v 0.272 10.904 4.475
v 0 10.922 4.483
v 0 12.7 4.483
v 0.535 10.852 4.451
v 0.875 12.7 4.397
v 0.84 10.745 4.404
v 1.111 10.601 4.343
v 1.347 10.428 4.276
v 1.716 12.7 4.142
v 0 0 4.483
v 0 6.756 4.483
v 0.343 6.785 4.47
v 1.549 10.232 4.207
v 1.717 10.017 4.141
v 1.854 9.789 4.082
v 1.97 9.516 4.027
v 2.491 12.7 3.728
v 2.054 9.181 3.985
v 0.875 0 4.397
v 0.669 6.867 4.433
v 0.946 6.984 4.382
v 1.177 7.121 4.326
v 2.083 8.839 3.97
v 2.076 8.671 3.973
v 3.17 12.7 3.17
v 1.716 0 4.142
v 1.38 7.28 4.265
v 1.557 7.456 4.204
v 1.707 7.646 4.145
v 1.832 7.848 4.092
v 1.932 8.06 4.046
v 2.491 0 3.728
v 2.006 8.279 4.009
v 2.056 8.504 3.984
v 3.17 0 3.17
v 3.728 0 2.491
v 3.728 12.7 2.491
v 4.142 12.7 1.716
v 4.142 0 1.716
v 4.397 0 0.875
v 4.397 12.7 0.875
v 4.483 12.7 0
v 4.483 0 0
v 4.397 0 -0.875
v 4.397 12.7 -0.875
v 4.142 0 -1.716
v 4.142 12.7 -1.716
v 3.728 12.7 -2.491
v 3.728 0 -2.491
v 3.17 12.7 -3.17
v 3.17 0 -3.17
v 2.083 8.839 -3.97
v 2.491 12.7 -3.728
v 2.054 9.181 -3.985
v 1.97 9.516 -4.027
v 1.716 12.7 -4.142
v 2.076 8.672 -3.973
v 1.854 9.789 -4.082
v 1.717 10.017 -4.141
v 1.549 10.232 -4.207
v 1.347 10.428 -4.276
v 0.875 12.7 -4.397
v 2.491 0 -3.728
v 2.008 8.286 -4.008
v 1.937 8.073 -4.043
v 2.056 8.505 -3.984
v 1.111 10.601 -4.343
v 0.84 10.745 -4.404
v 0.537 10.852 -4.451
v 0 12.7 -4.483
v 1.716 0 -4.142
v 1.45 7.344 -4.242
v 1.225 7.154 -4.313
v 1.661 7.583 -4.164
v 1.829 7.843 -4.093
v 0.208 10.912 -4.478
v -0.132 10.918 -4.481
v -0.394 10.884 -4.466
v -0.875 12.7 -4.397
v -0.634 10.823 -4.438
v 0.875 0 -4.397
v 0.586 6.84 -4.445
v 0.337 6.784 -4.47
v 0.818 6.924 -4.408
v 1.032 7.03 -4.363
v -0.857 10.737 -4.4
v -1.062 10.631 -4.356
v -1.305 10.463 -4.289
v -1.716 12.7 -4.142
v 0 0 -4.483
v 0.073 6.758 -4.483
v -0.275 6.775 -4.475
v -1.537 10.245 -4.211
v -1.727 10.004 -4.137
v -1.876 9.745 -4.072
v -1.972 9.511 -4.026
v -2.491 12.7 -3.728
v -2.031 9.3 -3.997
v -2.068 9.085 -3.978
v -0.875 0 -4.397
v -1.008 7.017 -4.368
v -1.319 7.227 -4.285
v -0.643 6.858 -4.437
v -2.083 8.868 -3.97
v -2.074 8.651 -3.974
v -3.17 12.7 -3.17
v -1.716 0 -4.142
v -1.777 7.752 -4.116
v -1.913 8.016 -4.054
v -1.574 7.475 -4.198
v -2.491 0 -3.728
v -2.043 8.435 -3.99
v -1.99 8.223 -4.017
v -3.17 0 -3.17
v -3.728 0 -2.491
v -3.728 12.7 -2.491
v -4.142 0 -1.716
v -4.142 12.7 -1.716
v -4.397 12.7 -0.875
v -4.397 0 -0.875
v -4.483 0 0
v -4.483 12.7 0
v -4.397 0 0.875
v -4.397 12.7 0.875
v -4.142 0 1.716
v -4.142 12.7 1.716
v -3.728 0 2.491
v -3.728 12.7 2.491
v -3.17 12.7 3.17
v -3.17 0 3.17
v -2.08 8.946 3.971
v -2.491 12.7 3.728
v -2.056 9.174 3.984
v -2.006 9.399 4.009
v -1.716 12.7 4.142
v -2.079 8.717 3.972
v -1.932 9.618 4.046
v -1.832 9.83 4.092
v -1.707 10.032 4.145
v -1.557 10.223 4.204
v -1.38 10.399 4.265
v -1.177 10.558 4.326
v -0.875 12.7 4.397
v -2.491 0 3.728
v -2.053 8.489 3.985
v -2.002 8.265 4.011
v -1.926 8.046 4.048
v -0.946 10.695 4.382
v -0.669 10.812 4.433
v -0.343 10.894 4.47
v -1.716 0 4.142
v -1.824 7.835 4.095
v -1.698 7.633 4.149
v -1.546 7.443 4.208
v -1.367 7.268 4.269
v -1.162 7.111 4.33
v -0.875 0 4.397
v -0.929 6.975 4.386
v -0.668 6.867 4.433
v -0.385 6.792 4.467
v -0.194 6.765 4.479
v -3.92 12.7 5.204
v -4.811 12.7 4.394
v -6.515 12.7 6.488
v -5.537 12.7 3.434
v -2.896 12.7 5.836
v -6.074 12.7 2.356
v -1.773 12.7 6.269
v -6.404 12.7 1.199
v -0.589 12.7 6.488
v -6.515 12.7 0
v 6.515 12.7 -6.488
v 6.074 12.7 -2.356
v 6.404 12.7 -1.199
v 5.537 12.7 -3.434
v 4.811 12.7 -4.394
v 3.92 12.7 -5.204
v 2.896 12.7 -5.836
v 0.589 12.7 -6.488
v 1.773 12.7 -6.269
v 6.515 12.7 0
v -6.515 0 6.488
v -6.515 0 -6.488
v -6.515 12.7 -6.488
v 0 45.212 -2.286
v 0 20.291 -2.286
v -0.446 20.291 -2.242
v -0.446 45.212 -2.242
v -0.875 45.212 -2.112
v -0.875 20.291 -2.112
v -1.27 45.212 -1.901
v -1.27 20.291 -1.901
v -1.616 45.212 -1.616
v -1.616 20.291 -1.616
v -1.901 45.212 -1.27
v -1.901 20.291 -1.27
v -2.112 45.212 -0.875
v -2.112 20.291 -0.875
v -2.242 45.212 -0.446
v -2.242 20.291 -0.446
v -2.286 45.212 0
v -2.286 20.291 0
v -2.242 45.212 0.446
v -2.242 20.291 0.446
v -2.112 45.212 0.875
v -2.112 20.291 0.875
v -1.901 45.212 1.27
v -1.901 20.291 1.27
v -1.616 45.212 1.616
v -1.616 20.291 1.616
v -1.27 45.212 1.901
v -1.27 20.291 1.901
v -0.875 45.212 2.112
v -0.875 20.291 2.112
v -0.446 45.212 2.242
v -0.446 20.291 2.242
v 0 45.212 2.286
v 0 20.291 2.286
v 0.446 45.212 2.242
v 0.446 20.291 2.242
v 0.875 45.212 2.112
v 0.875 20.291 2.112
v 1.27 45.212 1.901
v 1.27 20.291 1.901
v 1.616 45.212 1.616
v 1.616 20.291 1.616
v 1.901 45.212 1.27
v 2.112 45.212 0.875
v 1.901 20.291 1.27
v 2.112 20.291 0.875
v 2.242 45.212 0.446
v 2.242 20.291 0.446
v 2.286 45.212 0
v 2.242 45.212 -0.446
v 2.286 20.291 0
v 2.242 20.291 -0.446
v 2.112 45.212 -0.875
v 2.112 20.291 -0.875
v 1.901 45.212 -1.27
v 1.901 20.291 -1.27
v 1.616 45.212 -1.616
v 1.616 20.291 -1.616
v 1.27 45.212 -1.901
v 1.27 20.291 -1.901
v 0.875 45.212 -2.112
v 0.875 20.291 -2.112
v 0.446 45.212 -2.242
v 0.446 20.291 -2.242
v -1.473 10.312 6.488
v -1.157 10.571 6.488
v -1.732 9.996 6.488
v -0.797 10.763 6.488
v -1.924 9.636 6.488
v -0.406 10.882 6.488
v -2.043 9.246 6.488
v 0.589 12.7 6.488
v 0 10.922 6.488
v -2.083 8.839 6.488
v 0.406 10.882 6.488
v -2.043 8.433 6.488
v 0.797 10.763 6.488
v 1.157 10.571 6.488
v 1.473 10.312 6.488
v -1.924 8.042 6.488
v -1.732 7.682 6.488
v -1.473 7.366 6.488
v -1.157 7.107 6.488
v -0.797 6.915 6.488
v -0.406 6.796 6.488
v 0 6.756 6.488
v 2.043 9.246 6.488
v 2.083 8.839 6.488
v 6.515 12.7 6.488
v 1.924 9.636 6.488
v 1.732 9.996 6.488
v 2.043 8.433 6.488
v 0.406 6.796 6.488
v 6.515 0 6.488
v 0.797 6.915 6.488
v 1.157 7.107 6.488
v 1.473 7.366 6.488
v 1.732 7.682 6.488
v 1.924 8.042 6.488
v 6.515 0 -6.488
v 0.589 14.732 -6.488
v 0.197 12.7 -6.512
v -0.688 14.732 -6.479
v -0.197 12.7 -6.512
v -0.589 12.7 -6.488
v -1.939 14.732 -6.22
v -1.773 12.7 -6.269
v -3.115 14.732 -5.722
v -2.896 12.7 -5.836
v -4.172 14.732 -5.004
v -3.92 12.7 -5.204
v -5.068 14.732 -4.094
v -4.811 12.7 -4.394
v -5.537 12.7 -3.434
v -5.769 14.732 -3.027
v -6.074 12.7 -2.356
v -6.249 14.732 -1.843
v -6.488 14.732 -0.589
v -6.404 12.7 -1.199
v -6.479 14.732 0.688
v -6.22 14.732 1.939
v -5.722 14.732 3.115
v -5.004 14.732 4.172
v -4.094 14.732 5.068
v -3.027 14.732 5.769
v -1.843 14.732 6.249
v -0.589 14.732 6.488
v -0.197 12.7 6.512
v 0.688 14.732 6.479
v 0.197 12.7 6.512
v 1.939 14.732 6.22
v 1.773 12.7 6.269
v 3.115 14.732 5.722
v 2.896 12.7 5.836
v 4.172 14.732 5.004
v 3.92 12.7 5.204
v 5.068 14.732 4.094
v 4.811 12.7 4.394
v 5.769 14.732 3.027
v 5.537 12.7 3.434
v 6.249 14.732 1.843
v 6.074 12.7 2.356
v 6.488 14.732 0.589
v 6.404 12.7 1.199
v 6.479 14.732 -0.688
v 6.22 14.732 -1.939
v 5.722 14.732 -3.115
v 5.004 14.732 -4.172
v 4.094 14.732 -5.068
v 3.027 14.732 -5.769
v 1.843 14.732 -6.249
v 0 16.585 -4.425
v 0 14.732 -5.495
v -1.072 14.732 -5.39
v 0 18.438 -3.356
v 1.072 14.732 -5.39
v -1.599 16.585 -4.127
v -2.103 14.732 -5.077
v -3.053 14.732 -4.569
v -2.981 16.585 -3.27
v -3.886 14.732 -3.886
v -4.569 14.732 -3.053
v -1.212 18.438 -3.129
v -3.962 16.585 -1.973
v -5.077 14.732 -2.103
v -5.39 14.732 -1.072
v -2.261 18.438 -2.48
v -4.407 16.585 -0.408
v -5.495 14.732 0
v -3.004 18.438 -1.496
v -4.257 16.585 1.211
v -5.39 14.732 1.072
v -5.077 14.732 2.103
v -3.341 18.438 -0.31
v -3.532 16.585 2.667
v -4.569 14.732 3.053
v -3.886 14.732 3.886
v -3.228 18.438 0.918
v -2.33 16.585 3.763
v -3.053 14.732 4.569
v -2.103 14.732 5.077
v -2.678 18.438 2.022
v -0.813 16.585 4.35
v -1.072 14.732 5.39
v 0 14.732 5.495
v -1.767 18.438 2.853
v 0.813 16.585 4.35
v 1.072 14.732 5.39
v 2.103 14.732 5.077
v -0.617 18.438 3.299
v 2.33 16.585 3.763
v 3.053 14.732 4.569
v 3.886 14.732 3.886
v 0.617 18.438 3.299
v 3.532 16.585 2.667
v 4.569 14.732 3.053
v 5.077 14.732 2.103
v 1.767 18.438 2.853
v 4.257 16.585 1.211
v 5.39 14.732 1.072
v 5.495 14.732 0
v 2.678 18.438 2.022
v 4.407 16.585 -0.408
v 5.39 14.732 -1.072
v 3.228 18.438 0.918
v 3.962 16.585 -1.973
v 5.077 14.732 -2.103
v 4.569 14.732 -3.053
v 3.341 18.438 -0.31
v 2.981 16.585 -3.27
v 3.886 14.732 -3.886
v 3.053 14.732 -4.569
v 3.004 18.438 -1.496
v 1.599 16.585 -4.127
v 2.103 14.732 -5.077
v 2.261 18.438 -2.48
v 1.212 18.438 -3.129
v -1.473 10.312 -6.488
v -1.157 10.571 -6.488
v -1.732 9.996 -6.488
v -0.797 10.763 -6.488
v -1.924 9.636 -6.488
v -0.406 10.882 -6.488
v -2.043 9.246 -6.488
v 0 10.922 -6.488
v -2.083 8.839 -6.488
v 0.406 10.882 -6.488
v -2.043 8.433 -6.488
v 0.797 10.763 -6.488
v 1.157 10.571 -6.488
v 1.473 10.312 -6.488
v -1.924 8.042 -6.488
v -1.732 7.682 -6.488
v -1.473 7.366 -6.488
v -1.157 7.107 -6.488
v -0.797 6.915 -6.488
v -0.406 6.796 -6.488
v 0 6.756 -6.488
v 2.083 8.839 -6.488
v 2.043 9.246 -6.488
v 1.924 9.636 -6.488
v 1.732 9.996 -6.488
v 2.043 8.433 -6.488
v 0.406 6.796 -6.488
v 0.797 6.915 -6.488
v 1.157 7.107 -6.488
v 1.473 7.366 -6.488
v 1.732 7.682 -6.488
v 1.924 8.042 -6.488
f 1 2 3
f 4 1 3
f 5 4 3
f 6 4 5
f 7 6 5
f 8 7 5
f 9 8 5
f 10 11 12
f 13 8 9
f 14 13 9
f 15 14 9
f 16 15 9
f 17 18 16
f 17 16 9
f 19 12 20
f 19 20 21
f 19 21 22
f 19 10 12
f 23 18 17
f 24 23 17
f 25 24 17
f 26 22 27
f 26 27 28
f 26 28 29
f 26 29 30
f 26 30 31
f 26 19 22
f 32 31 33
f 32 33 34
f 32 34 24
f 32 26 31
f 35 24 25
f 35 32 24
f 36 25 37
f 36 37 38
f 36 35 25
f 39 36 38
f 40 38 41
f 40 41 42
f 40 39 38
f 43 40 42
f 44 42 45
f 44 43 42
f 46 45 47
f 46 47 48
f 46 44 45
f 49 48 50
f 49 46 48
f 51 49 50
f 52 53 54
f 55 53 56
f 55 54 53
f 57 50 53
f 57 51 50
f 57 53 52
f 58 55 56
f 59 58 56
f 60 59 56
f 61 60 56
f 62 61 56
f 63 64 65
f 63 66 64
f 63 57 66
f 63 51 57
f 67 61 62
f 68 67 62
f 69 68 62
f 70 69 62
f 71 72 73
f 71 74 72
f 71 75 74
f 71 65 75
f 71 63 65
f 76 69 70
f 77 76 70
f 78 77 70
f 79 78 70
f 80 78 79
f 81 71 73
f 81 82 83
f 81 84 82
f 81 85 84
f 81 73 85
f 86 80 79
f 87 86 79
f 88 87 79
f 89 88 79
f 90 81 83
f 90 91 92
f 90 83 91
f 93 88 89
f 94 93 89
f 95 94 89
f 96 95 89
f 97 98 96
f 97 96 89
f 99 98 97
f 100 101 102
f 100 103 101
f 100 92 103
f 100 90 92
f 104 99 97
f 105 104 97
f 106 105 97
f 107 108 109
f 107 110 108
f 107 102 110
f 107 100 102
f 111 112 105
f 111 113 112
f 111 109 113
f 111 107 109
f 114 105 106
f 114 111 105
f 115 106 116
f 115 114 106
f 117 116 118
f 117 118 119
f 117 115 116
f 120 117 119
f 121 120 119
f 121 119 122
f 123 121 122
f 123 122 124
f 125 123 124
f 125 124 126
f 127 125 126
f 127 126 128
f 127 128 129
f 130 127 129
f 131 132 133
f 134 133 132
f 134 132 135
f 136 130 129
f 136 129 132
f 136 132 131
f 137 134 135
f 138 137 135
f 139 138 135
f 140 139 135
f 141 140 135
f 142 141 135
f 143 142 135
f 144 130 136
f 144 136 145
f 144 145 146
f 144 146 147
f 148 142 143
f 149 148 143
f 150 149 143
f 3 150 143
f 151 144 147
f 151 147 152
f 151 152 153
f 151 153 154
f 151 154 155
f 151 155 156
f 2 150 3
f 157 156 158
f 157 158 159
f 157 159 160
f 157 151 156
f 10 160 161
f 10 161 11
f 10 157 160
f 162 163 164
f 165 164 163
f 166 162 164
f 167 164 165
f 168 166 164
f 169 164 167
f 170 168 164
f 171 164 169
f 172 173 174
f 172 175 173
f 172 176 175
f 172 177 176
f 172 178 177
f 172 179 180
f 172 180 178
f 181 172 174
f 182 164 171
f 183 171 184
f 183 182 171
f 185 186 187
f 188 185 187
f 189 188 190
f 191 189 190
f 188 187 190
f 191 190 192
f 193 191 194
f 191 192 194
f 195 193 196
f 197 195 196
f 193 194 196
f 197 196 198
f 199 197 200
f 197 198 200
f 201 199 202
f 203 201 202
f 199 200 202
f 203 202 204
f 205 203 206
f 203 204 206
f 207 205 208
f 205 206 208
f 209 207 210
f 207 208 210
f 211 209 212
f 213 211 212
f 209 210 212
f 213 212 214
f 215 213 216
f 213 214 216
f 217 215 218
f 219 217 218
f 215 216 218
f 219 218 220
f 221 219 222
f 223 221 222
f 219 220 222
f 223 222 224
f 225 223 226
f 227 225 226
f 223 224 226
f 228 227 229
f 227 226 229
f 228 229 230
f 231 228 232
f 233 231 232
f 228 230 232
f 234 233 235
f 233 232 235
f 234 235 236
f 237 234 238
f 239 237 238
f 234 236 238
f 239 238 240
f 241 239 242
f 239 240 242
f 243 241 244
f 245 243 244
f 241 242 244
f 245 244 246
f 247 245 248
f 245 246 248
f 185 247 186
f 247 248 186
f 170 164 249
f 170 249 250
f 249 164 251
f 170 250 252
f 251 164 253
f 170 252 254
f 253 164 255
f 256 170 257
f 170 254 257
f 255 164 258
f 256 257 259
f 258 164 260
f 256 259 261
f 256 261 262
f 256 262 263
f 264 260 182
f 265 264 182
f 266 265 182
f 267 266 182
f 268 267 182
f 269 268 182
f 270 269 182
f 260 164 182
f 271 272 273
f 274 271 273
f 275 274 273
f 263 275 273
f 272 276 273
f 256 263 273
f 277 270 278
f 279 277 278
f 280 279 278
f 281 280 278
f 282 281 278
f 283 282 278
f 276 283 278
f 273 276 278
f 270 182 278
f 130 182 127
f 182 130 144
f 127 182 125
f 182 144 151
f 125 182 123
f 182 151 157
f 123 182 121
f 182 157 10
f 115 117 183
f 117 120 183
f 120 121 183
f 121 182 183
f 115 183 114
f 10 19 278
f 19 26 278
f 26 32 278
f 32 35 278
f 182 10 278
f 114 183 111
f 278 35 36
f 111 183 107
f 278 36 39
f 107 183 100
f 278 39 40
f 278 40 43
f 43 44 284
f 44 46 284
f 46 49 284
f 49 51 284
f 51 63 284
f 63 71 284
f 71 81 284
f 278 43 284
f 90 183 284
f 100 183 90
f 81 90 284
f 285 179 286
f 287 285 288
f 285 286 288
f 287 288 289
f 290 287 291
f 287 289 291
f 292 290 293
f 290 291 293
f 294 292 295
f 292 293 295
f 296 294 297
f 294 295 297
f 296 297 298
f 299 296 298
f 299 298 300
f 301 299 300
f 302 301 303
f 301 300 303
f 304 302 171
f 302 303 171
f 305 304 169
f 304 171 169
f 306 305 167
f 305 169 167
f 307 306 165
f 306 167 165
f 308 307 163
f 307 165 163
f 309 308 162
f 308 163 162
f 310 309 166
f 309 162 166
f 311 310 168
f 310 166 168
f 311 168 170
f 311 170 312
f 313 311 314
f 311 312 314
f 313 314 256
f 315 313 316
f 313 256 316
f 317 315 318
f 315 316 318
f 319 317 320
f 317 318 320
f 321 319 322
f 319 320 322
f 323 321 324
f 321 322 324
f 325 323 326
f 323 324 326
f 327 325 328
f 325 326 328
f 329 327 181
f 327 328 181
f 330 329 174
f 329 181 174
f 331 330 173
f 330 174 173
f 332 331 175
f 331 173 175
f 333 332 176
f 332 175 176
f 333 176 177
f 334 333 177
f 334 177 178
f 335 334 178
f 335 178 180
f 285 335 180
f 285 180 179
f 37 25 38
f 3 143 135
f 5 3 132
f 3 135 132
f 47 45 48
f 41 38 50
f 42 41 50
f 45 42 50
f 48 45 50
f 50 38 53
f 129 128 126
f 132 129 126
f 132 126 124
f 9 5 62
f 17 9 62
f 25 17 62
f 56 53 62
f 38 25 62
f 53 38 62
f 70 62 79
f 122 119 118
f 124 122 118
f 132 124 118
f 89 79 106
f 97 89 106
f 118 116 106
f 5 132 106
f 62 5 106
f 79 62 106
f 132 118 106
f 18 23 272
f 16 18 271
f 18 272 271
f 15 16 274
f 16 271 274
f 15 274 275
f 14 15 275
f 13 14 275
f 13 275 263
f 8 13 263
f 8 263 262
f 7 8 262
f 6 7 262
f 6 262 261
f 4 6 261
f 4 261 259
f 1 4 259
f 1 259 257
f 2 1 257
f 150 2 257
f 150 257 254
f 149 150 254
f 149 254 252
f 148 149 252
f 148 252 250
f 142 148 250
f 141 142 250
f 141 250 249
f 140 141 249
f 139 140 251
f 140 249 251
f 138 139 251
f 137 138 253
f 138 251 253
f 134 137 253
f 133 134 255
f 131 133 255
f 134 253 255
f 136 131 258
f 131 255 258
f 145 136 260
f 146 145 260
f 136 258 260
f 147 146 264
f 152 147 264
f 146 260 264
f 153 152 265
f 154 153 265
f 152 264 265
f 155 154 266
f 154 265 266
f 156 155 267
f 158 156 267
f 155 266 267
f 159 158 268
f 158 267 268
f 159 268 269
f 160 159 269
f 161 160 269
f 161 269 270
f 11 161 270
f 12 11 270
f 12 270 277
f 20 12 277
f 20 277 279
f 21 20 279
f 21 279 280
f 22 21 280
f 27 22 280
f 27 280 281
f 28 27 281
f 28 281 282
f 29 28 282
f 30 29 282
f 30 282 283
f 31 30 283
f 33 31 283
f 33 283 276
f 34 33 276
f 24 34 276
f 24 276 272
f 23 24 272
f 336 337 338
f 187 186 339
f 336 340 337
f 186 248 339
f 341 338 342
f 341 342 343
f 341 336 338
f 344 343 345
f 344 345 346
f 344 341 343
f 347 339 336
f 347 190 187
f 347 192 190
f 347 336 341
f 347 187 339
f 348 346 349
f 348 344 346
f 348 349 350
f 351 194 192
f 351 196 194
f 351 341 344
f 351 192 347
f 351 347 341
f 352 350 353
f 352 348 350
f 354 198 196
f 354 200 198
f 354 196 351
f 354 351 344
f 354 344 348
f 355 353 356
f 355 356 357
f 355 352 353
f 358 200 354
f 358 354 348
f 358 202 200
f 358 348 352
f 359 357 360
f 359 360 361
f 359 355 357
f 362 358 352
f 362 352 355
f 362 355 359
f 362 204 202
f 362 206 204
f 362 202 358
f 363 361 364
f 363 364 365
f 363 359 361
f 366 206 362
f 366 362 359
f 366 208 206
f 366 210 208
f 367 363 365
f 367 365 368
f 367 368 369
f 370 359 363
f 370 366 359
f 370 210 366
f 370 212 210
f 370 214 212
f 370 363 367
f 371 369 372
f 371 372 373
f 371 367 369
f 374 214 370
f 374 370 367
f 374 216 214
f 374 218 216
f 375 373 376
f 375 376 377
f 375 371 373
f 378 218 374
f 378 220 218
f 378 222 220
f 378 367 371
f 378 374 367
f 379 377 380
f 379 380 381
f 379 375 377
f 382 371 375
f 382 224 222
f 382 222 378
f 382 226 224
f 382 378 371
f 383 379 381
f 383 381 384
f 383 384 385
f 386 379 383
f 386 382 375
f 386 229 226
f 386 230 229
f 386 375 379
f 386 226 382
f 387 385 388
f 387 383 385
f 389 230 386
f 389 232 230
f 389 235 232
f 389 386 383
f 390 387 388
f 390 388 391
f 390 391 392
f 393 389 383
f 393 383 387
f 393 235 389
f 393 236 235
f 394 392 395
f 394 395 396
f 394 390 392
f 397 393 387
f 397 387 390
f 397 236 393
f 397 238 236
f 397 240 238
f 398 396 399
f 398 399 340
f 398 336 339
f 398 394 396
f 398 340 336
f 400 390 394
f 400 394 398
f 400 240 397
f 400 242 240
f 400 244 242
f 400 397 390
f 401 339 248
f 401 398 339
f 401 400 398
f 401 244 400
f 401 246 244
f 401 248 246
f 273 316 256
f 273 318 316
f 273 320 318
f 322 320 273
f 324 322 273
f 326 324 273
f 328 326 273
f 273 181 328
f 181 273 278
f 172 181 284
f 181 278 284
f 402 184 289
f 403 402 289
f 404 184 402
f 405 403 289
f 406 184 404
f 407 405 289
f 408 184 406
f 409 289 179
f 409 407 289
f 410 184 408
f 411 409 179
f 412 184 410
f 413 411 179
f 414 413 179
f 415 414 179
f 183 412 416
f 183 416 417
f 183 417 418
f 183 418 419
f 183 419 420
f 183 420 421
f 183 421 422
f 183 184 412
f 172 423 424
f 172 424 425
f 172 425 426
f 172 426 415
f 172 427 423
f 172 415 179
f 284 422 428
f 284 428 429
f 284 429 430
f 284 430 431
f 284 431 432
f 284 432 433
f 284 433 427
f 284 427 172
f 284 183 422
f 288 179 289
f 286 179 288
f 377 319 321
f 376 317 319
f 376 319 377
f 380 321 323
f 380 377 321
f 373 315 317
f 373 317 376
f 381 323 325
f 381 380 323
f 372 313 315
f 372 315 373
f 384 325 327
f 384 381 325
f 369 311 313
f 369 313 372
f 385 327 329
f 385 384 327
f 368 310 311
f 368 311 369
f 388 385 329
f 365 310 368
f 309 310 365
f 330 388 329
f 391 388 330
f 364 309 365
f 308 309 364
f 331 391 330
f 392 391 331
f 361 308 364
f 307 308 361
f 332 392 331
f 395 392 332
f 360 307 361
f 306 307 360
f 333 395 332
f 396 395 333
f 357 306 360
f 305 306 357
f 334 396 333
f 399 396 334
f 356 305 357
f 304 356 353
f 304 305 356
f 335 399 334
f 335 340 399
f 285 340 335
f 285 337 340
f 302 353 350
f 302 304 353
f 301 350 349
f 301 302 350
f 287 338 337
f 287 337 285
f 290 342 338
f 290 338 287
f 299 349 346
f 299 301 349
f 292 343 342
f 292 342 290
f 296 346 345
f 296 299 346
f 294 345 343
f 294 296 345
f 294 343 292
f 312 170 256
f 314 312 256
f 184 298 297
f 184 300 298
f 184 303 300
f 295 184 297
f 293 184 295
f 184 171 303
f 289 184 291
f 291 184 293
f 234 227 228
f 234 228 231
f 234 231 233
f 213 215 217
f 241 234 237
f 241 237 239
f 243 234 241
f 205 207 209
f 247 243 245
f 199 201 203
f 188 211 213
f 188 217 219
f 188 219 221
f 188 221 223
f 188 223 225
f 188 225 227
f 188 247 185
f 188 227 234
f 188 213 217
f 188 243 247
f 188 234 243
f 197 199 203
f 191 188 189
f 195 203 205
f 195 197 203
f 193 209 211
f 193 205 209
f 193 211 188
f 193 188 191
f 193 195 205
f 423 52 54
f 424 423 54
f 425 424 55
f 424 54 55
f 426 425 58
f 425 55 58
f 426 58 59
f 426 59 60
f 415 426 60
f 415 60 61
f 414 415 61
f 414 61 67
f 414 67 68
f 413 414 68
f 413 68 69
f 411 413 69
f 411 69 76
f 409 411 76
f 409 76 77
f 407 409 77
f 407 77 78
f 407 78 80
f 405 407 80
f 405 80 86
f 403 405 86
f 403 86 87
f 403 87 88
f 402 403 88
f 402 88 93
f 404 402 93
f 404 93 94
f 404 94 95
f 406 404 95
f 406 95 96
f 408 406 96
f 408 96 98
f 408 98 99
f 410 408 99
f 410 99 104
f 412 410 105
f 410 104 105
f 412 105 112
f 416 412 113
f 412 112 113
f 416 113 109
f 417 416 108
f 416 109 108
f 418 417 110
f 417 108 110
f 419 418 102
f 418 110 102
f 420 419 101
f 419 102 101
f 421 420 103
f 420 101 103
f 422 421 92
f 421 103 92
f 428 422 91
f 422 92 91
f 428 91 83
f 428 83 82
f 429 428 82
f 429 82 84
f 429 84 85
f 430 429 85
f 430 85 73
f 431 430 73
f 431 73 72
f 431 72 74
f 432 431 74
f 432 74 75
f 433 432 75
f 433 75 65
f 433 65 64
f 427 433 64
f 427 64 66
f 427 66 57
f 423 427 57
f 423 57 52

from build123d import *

# Parameters (mm, degrees)
SKETCH4_W           = 13.0302
SKETCH4_H           = 12.976851724
SKETCH4_R           = 4.4831
BOSS_EXTRUDE3_DEPTH = 12.7
SKETCH5_R           = 2.0828
CUT_EXTRUDE4_DEPTH  = 15.24
SKETCH6_R           = 6.5151
BOSS_EXTRUDE4_DEPTH = 2.032
SKETCH7_R           = 2.286
BOSS_EXTRUDE6_DEPTH = 30.48
CHAMFER1_SIZE       = 3.20923319
CHAMFER1_SIZE2      = 5.558554938


with BuildPart() as part:
    # Sketch4 → Boss-Extrude3 (new body)
    with BuildSketch(Plane(origin=(0, 0, 0), x_dir=(1, 0, 0), z_dir=(0, 1, 0))):
        Rectangle(SKETCH4_W, SKETCH4_H)
        with Locations(Location((0, 0, 0), (0, 0, 270))):
            Circle(SKETCH4_R, mode=Mode.SUBTRACT)
    extrude(amount=BOSS_EXTRUDE3_DEPTH)

    # Sketch5 → Cut-Extrude4 (cut)
    with BuildSketch(Plane.XY.offset(6.488425862)):
        with Locations((0, 8.8392)):
            Circle(SKETCH5_R)
    extrude(amount=-CUT_EXTRUDE4_DEPTH, mode=Mode.SUBTRACT)

    # Sketch6 → Boss-Extrude4 (add)
    with BuildSketch(Plane(origin=(0, 12.7, 0), x_dir=(1, 0, 0), z_dir=(0, 1, 0))):
        with Locations(Location((0, 0, 0), (0, 0, 84.813545561))):
            Circle(SKETCH6_R)
    extrude(amount=BOSS_EXTRUDE4_DEPTH)

    # Sketch7 → Boss-Extrude6 (add)
    with BuildSketch(Plane(origin=(0, 14.732, 0), x_dir=(1, 0, 0), z_dir=(0, 1, 0))):
        with Locations(Location((0, 0, 0), (0, 0, 90))):
            Circle(SKETCH7_R)
    extrude(amount=BOSS_EXTRUDE6_DEPTH)

    # Chamfer1
    chamfer1_edges = [part.edges().sort_by_distance(p)[0] for p in [
        (0, 14.732, 2.286),
    ]]
    chamfer1_side = [part.faces().sort_by_distance(p)[0] for p in [
        (-0.572288462, 14.732, 6.304905465),
    ]]
    chamfer(chamfer1_edges, length=CHAMFER1_SIZE, length2=CHAMFER1_SIZE2, reference=chamfer1_side[0])


solid = part.part
